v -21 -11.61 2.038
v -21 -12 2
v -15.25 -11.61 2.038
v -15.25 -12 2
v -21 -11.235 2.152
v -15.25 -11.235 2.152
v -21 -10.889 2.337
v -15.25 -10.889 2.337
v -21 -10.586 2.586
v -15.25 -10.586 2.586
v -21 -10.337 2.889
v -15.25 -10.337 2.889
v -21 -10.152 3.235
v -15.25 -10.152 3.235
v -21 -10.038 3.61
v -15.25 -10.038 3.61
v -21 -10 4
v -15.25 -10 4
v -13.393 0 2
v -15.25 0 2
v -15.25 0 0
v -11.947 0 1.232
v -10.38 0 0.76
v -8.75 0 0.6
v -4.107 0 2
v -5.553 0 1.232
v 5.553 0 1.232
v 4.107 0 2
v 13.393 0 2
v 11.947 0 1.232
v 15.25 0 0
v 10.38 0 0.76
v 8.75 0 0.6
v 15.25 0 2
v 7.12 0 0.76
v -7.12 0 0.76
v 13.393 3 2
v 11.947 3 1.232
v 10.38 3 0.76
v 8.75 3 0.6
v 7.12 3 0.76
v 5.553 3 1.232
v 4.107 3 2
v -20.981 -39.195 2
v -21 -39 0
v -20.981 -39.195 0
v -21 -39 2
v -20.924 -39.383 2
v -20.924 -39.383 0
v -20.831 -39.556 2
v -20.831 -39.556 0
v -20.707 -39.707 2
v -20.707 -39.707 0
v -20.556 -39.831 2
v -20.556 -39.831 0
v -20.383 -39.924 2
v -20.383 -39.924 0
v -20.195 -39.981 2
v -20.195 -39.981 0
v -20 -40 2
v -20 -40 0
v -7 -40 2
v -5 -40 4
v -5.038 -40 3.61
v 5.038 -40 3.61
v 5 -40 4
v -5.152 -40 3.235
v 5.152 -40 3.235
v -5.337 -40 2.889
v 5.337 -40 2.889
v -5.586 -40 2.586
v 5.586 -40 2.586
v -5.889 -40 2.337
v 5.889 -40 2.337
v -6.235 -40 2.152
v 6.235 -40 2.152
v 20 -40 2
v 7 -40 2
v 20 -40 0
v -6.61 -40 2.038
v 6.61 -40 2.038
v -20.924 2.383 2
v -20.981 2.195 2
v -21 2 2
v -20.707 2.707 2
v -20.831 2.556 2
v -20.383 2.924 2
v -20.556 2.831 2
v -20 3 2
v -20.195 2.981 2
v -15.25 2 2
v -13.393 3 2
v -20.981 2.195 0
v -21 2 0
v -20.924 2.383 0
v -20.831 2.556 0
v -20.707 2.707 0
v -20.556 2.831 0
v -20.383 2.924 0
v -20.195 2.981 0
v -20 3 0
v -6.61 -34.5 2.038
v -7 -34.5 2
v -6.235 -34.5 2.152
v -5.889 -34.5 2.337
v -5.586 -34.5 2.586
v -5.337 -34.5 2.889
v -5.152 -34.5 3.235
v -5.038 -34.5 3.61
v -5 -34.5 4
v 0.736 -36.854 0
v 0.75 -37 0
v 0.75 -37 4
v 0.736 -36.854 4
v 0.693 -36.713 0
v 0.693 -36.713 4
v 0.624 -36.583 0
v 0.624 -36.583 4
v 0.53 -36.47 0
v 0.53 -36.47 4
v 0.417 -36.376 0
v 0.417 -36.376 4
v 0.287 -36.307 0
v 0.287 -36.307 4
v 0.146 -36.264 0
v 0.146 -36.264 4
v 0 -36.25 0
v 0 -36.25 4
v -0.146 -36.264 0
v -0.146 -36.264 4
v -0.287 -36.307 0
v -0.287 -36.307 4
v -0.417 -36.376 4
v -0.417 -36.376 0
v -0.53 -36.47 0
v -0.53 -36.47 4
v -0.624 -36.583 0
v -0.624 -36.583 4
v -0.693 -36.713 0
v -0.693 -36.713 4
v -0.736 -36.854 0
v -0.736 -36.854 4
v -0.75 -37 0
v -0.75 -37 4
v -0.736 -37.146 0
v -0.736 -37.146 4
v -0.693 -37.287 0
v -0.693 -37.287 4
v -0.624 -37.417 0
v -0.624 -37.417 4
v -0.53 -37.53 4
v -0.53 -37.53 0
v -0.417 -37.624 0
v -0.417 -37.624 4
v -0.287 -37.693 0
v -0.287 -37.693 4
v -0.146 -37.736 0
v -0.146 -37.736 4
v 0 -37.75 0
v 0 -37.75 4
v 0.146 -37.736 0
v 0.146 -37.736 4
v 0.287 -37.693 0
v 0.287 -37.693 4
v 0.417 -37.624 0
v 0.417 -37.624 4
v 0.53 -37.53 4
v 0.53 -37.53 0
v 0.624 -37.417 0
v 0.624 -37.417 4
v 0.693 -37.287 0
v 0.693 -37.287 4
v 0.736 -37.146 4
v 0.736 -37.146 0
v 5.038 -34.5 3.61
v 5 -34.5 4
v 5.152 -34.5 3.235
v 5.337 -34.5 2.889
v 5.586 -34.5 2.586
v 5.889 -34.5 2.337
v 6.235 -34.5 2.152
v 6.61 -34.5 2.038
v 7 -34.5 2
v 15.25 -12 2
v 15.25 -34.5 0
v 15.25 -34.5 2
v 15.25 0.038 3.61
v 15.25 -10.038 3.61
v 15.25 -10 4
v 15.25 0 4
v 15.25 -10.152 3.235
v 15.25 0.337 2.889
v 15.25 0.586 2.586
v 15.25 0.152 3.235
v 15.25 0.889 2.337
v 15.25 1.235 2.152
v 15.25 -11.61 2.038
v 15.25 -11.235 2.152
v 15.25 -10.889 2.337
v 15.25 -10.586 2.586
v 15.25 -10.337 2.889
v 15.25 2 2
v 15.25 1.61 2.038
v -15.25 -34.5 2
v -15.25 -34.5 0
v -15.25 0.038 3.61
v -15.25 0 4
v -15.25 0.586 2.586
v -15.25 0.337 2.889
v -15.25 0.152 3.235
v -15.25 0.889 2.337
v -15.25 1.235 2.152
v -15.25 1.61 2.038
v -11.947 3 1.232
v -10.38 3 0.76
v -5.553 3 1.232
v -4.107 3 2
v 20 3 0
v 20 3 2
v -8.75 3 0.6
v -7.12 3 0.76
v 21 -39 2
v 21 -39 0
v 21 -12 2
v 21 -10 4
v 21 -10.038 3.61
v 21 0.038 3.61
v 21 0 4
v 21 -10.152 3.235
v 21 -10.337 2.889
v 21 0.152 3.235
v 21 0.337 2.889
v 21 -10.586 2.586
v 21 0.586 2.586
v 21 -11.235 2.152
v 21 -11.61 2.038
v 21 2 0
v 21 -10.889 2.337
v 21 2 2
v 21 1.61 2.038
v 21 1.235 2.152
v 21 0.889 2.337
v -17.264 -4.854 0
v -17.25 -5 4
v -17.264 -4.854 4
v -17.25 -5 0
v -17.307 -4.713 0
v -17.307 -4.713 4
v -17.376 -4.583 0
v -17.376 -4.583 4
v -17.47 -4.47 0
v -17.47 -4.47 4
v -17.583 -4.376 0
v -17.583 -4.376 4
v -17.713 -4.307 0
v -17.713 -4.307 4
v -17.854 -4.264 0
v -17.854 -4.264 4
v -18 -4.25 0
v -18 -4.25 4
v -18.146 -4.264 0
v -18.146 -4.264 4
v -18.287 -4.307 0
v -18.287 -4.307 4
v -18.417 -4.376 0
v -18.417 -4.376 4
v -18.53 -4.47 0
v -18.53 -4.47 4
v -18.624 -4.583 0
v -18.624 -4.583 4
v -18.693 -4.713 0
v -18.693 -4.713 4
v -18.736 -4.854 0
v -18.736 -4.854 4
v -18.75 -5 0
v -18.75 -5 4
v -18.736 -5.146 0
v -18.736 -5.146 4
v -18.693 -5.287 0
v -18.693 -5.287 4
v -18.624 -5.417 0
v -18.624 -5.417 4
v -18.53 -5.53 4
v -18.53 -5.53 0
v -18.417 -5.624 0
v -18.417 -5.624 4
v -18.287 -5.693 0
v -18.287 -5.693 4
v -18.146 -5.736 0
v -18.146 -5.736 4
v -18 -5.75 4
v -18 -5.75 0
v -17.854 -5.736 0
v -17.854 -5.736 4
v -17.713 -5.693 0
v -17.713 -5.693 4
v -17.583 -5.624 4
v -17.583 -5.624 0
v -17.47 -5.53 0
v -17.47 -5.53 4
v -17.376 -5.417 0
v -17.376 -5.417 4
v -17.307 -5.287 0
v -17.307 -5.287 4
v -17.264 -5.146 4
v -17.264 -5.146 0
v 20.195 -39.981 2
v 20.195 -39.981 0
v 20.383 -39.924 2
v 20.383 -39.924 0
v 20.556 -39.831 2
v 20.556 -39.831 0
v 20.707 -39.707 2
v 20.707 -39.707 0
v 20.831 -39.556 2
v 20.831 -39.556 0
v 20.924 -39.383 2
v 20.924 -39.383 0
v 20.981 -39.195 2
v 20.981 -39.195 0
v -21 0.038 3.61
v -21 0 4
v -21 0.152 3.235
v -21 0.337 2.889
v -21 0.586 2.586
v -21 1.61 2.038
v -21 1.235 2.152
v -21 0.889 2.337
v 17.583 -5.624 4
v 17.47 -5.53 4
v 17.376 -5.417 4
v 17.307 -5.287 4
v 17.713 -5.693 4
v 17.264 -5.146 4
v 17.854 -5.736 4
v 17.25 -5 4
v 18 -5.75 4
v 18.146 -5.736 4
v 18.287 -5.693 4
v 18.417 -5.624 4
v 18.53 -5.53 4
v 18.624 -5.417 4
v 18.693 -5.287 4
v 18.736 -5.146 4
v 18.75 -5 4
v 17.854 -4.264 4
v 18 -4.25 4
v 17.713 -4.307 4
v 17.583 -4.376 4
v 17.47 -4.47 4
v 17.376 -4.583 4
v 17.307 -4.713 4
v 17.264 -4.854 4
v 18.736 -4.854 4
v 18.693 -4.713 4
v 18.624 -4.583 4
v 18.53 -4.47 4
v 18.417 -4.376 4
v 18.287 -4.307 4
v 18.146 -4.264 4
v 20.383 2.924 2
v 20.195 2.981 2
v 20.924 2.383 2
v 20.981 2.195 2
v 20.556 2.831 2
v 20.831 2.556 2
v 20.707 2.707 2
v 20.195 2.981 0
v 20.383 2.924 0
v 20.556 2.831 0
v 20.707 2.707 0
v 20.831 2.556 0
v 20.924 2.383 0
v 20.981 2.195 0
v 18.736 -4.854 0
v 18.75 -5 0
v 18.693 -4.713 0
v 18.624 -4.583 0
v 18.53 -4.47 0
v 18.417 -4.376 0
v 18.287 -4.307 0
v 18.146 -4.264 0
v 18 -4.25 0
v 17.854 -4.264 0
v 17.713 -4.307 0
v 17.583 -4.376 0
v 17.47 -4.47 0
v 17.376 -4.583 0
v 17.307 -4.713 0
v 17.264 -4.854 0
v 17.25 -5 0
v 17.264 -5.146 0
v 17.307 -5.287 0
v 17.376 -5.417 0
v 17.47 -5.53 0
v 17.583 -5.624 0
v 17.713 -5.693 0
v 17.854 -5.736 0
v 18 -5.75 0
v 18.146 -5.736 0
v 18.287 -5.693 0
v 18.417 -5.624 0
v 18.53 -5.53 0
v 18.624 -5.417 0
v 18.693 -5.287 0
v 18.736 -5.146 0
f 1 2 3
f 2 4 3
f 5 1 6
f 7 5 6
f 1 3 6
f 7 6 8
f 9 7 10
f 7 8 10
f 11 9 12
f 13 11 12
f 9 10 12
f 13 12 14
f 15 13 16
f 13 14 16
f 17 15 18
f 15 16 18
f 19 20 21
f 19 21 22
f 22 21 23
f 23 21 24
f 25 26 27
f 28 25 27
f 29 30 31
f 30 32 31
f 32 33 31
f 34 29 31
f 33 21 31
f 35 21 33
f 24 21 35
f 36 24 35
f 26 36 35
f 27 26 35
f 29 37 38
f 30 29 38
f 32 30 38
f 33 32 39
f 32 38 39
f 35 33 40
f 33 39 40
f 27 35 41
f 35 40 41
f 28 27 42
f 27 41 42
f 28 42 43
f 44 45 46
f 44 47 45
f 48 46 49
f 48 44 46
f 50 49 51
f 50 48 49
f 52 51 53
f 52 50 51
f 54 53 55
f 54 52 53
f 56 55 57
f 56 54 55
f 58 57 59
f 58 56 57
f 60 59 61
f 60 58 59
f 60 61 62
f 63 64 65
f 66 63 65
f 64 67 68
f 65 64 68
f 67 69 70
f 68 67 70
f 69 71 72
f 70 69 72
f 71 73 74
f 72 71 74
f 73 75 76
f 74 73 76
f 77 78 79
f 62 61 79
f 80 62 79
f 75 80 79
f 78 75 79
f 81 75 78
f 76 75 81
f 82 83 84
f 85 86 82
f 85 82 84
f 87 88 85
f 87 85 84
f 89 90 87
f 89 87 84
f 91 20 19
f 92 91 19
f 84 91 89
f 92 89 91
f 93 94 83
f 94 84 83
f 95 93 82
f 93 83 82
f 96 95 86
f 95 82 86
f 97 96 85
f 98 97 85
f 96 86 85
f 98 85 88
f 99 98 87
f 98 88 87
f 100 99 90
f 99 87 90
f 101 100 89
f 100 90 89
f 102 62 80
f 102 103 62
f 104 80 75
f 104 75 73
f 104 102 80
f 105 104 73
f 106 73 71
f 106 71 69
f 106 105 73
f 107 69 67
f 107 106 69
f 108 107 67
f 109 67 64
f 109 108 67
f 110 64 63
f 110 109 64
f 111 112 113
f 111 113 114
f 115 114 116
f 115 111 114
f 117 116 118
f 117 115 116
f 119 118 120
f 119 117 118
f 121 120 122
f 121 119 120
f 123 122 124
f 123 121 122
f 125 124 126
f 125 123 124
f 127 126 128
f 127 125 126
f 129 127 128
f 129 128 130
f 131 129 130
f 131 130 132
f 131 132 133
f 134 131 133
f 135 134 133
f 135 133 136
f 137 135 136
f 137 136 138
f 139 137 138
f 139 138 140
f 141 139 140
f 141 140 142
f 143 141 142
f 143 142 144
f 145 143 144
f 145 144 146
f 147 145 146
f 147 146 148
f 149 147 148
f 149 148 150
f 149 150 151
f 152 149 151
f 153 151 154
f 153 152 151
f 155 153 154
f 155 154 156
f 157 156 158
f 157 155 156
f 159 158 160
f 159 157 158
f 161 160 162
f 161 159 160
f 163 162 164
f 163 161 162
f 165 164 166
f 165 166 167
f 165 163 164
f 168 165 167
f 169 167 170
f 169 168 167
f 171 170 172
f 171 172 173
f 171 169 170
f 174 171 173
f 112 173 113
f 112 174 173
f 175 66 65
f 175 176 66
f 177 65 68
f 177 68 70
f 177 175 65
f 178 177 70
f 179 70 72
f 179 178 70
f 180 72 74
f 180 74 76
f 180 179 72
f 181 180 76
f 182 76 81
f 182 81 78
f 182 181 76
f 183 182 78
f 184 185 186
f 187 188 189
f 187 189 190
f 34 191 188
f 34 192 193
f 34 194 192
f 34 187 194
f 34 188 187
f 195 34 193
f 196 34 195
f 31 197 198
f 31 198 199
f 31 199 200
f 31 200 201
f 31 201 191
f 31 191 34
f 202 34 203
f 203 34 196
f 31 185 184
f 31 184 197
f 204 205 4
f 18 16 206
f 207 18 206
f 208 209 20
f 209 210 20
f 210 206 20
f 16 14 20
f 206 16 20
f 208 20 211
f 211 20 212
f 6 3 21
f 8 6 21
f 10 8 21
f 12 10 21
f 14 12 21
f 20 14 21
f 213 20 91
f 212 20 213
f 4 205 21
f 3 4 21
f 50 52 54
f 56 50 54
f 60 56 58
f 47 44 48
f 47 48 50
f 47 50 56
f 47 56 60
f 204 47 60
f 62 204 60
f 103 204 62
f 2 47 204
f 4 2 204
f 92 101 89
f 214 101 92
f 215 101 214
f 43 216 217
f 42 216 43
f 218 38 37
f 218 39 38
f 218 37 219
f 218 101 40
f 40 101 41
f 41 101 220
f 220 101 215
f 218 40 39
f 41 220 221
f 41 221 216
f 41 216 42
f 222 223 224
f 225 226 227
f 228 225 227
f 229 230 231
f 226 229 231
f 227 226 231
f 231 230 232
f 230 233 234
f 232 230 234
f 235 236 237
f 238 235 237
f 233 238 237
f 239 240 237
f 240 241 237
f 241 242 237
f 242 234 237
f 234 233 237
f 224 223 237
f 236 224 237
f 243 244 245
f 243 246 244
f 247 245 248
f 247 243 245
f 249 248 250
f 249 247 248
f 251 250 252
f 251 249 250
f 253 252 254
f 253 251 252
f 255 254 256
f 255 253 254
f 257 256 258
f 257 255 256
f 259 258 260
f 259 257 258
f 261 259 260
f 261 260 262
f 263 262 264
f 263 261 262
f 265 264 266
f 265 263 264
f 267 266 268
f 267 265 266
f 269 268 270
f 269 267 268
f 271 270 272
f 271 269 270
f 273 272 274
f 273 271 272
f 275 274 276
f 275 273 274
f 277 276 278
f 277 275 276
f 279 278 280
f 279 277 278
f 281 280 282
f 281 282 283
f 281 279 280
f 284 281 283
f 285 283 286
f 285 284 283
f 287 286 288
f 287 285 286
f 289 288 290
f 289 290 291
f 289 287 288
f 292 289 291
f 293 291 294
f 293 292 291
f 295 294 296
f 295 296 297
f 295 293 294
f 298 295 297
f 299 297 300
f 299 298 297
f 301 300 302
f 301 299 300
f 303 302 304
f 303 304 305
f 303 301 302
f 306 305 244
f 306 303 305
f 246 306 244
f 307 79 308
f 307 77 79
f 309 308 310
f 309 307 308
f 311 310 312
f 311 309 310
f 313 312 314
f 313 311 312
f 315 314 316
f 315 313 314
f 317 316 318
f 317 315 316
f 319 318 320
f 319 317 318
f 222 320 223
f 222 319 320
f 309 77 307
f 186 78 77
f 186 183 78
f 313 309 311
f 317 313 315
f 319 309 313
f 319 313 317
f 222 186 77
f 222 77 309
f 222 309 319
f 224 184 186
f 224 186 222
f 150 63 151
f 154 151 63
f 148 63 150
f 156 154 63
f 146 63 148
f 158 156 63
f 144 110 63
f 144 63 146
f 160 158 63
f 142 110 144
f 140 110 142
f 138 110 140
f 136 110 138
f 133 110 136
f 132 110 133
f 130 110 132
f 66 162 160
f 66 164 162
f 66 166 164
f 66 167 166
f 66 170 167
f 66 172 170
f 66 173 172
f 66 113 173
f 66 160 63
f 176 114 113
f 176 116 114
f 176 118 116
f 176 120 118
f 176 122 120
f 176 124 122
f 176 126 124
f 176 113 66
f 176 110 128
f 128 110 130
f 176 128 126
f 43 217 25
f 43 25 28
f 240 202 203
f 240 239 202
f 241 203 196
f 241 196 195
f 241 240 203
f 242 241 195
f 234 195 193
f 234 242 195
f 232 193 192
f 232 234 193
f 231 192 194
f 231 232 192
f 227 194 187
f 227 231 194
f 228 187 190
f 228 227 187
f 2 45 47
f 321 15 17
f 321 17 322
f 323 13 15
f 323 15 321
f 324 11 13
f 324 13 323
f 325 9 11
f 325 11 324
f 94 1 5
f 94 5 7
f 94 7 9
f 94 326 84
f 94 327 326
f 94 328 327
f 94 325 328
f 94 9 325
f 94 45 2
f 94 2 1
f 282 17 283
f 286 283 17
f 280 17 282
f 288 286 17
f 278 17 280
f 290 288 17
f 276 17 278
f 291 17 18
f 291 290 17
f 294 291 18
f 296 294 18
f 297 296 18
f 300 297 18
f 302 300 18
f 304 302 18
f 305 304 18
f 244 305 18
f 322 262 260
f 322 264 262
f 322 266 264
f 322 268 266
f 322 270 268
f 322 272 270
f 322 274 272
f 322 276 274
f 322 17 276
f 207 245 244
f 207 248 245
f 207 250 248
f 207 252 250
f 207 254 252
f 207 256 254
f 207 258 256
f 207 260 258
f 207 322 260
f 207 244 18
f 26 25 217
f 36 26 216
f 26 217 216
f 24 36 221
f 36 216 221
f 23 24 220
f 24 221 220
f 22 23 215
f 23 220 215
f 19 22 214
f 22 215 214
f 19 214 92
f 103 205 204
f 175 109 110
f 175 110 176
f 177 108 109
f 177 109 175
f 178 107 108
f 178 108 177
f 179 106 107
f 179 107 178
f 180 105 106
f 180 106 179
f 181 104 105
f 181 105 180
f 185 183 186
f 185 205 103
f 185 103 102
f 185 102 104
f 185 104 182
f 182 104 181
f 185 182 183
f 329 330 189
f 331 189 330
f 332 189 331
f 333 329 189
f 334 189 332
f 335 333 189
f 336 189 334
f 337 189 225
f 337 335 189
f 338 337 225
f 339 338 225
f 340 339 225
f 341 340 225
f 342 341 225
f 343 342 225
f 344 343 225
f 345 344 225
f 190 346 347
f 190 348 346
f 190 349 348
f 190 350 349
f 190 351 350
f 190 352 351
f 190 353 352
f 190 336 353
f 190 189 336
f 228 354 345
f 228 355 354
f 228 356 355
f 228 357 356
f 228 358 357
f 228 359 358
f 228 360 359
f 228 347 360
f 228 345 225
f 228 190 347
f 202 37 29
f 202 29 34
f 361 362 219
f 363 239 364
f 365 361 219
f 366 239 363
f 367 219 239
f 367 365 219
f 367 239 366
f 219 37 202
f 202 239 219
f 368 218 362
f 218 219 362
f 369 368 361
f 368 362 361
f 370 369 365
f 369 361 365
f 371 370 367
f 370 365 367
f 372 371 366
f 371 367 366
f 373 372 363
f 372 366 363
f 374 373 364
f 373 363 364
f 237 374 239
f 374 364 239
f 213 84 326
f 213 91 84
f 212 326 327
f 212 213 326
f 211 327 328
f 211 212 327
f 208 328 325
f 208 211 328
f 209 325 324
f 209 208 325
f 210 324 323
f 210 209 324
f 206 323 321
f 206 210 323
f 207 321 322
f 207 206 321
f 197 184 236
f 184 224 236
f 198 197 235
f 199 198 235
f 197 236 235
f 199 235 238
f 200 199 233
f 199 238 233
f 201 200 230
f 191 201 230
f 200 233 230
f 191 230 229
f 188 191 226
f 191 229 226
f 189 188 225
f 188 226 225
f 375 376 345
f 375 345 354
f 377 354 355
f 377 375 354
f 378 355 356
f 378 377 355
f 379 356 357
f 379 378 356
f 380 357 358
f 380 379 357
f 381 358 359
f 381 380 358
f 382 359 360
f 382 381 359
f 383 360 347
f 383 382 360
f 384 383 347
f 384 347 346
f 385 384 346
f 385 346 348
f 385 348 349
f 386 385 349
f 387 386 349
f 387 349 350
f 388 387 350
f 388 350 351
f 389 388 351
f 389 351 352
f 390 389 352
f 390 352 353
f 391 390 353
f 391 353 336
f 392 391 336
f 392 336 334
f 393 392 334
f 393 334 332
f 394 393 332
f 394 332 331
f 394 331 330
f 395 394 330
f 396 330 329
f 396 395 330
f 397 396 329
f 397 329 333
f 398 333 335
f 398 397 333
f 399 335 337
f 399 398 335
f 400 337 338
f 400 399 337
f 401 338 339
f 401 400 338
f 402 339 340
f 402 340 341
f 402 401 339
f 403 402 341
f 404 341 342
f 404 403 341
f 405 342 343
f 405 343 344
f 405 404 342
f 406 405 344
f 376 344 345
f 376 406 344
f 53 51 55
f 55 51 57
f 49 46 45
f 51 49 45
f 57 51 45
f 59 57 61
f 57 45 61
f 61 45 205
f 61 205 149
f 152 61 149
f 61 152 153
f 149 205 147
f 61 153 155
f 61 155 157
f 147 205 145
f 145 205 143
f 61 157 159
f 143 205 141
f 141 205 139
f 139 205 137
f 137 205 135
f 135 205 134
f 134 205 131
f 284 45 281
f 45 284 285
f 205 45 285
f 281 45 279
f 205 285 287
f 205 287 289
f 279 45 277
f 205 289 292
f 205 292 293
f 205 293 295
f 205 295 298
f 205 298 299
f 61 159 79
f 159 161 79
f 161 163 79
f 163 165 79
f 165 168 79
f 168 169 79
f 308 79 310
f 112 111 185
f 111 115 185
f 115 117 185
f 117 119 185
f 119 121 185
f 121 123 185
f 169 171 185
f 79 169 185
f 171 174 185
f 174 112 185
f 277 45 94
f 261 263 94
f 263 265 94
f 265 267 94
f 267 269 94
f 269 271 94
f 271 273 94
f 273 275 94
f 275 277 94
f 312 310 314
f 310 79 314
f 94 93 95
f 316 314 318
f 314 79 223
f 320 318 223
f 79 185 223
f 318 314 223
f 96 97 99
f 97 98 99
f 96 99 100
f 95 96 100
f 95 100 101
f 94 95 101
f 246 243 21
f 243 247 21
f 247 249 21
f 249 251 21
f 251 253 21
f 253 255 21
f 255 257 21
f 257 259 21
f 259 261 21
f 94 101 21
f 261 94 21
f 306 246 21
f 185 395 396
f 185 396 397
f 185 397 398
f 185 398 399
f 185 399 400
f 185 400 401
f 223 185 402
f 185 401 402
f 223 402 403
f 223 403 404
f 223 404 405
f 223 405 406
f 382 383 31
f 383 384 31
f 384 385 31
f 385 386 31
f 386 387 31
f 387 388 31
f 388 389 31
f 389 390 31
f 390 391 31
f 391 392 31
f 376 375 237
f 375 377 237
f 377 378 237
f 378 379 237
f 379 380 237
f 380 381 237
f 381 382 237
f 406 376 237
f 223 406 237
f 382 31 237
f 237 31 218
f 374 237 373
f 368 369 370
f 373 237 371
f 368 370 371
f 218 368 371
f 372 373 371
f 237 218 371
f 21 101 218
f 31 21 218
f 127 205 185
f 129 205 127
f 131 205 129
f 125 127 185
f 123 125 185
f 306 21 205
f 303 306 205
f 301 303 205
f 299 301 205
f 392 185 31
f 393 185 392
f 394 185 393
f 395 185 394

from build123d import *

# Parameters (mm, degrees)
F0_W     = 42
F0_H     = 43
F0_R     = 0.75
F0_W_2   = 30.5
F0_H_2   = 34.5
F1_DEPTH = 2
F2_W     = 5.75
F2_H     = 10
F2_R     = 0.75
F2_W_2   = 10
F2_H_2   = 5.5
F3_DEPTH = 2
F4_R     = 8.4
F5_DEPTH = 3
F6_R     = 1.99999
F7_R     = 1


# Not quite as in the source:
# - a fillet or chamfer is up to 0.001 mm smaller than in the source, because OpenCascade refuses the exact size


with BuildPart() as f1:
    # F0 (on Top) → F1 (new body)
    with BuildSketch(Plane.XY):
        with Locations((0, -18.5)):
            Rectangle(F0_W, F0_H)
        with Locations((0, -37)):
            Circle(F0_R, mode=Mode.SUBTRACT)
        with Locations((-18, -5)):
            Circle(F0_R, mode=Mode.SUBTRACT)
        with Locations((0, -17.25)):
            Rectangle(F0_W_2, F0_H_2, mode=Mode.SUBTRACT)
        with Locations((18, -5)):
            Circle(F0_R, mode=Mode.SUBTRACT)
    extrude(amount=F1_DEPTH)

    # F2 (on face) → F3 (join)
    with BuildSketch(Plane.XY.offset(2)):
        with Locations((-18.125, -5)):
            Rectangle(F2_W, F2_H)
        with Locations((-18, -5)):
            Circle(F2_R, mode=Mode.SUBTRACT)
        with Locations((18.125, -5)):
            Rectangle(F2_W, F2_H)
        with Locations((18, -5)):
            Circle(F2_R, mode=Mode.SUBTRACT)
        with Locations((0, -37.25)):
            Rectangle(F2_W_2, F2_H_2)
        with Locations((0, -37)):
            Circle(F2_R, mode=Mode.SUBTRACT)
    extrude(amount=F3_DEPTH)

    # F4 (on face) → F5 (cut, through all)
    with BuildSketch(Plane(origin=(0, 3, 0), x_dir=(-1, 0, 0), z_dir=(0, 1, 0))):
        with Locations((-8.75, 9)):
            Circle(F4_R)
        with Locations((8.75, 9)):
            Circle(F4_R)
    extrude(amount=-F5_DEPTH, mode=Mode.SUBTRACT)

    # F6 (radius 2 in the source; OpenCascade refuses exactly that, so slightly less here)
    f6_edges = [f1.edges().sort_by_distance(p)[0] for p in [
        (5, -37.25, 2),
        (18.125, -10, 2),
        (-18.125, -10, 2),
        (-5, -37.25, 2),
        (18.125, 0, 2),
        (-18.125, 0, 2),
    ]]
    fillet(f6_edges, radius=F6_R)

    # F7
    f7_edges = [f1.edges().sort_by_distance(p)[0] for p in [
        (-21, -40, 1),
        (-21, 3, 1),
        (21, -40, 1),
        (21, 3, 1),
    ]]
    fillet(f7_edges, radius=F7_R)


solid = f1.part
